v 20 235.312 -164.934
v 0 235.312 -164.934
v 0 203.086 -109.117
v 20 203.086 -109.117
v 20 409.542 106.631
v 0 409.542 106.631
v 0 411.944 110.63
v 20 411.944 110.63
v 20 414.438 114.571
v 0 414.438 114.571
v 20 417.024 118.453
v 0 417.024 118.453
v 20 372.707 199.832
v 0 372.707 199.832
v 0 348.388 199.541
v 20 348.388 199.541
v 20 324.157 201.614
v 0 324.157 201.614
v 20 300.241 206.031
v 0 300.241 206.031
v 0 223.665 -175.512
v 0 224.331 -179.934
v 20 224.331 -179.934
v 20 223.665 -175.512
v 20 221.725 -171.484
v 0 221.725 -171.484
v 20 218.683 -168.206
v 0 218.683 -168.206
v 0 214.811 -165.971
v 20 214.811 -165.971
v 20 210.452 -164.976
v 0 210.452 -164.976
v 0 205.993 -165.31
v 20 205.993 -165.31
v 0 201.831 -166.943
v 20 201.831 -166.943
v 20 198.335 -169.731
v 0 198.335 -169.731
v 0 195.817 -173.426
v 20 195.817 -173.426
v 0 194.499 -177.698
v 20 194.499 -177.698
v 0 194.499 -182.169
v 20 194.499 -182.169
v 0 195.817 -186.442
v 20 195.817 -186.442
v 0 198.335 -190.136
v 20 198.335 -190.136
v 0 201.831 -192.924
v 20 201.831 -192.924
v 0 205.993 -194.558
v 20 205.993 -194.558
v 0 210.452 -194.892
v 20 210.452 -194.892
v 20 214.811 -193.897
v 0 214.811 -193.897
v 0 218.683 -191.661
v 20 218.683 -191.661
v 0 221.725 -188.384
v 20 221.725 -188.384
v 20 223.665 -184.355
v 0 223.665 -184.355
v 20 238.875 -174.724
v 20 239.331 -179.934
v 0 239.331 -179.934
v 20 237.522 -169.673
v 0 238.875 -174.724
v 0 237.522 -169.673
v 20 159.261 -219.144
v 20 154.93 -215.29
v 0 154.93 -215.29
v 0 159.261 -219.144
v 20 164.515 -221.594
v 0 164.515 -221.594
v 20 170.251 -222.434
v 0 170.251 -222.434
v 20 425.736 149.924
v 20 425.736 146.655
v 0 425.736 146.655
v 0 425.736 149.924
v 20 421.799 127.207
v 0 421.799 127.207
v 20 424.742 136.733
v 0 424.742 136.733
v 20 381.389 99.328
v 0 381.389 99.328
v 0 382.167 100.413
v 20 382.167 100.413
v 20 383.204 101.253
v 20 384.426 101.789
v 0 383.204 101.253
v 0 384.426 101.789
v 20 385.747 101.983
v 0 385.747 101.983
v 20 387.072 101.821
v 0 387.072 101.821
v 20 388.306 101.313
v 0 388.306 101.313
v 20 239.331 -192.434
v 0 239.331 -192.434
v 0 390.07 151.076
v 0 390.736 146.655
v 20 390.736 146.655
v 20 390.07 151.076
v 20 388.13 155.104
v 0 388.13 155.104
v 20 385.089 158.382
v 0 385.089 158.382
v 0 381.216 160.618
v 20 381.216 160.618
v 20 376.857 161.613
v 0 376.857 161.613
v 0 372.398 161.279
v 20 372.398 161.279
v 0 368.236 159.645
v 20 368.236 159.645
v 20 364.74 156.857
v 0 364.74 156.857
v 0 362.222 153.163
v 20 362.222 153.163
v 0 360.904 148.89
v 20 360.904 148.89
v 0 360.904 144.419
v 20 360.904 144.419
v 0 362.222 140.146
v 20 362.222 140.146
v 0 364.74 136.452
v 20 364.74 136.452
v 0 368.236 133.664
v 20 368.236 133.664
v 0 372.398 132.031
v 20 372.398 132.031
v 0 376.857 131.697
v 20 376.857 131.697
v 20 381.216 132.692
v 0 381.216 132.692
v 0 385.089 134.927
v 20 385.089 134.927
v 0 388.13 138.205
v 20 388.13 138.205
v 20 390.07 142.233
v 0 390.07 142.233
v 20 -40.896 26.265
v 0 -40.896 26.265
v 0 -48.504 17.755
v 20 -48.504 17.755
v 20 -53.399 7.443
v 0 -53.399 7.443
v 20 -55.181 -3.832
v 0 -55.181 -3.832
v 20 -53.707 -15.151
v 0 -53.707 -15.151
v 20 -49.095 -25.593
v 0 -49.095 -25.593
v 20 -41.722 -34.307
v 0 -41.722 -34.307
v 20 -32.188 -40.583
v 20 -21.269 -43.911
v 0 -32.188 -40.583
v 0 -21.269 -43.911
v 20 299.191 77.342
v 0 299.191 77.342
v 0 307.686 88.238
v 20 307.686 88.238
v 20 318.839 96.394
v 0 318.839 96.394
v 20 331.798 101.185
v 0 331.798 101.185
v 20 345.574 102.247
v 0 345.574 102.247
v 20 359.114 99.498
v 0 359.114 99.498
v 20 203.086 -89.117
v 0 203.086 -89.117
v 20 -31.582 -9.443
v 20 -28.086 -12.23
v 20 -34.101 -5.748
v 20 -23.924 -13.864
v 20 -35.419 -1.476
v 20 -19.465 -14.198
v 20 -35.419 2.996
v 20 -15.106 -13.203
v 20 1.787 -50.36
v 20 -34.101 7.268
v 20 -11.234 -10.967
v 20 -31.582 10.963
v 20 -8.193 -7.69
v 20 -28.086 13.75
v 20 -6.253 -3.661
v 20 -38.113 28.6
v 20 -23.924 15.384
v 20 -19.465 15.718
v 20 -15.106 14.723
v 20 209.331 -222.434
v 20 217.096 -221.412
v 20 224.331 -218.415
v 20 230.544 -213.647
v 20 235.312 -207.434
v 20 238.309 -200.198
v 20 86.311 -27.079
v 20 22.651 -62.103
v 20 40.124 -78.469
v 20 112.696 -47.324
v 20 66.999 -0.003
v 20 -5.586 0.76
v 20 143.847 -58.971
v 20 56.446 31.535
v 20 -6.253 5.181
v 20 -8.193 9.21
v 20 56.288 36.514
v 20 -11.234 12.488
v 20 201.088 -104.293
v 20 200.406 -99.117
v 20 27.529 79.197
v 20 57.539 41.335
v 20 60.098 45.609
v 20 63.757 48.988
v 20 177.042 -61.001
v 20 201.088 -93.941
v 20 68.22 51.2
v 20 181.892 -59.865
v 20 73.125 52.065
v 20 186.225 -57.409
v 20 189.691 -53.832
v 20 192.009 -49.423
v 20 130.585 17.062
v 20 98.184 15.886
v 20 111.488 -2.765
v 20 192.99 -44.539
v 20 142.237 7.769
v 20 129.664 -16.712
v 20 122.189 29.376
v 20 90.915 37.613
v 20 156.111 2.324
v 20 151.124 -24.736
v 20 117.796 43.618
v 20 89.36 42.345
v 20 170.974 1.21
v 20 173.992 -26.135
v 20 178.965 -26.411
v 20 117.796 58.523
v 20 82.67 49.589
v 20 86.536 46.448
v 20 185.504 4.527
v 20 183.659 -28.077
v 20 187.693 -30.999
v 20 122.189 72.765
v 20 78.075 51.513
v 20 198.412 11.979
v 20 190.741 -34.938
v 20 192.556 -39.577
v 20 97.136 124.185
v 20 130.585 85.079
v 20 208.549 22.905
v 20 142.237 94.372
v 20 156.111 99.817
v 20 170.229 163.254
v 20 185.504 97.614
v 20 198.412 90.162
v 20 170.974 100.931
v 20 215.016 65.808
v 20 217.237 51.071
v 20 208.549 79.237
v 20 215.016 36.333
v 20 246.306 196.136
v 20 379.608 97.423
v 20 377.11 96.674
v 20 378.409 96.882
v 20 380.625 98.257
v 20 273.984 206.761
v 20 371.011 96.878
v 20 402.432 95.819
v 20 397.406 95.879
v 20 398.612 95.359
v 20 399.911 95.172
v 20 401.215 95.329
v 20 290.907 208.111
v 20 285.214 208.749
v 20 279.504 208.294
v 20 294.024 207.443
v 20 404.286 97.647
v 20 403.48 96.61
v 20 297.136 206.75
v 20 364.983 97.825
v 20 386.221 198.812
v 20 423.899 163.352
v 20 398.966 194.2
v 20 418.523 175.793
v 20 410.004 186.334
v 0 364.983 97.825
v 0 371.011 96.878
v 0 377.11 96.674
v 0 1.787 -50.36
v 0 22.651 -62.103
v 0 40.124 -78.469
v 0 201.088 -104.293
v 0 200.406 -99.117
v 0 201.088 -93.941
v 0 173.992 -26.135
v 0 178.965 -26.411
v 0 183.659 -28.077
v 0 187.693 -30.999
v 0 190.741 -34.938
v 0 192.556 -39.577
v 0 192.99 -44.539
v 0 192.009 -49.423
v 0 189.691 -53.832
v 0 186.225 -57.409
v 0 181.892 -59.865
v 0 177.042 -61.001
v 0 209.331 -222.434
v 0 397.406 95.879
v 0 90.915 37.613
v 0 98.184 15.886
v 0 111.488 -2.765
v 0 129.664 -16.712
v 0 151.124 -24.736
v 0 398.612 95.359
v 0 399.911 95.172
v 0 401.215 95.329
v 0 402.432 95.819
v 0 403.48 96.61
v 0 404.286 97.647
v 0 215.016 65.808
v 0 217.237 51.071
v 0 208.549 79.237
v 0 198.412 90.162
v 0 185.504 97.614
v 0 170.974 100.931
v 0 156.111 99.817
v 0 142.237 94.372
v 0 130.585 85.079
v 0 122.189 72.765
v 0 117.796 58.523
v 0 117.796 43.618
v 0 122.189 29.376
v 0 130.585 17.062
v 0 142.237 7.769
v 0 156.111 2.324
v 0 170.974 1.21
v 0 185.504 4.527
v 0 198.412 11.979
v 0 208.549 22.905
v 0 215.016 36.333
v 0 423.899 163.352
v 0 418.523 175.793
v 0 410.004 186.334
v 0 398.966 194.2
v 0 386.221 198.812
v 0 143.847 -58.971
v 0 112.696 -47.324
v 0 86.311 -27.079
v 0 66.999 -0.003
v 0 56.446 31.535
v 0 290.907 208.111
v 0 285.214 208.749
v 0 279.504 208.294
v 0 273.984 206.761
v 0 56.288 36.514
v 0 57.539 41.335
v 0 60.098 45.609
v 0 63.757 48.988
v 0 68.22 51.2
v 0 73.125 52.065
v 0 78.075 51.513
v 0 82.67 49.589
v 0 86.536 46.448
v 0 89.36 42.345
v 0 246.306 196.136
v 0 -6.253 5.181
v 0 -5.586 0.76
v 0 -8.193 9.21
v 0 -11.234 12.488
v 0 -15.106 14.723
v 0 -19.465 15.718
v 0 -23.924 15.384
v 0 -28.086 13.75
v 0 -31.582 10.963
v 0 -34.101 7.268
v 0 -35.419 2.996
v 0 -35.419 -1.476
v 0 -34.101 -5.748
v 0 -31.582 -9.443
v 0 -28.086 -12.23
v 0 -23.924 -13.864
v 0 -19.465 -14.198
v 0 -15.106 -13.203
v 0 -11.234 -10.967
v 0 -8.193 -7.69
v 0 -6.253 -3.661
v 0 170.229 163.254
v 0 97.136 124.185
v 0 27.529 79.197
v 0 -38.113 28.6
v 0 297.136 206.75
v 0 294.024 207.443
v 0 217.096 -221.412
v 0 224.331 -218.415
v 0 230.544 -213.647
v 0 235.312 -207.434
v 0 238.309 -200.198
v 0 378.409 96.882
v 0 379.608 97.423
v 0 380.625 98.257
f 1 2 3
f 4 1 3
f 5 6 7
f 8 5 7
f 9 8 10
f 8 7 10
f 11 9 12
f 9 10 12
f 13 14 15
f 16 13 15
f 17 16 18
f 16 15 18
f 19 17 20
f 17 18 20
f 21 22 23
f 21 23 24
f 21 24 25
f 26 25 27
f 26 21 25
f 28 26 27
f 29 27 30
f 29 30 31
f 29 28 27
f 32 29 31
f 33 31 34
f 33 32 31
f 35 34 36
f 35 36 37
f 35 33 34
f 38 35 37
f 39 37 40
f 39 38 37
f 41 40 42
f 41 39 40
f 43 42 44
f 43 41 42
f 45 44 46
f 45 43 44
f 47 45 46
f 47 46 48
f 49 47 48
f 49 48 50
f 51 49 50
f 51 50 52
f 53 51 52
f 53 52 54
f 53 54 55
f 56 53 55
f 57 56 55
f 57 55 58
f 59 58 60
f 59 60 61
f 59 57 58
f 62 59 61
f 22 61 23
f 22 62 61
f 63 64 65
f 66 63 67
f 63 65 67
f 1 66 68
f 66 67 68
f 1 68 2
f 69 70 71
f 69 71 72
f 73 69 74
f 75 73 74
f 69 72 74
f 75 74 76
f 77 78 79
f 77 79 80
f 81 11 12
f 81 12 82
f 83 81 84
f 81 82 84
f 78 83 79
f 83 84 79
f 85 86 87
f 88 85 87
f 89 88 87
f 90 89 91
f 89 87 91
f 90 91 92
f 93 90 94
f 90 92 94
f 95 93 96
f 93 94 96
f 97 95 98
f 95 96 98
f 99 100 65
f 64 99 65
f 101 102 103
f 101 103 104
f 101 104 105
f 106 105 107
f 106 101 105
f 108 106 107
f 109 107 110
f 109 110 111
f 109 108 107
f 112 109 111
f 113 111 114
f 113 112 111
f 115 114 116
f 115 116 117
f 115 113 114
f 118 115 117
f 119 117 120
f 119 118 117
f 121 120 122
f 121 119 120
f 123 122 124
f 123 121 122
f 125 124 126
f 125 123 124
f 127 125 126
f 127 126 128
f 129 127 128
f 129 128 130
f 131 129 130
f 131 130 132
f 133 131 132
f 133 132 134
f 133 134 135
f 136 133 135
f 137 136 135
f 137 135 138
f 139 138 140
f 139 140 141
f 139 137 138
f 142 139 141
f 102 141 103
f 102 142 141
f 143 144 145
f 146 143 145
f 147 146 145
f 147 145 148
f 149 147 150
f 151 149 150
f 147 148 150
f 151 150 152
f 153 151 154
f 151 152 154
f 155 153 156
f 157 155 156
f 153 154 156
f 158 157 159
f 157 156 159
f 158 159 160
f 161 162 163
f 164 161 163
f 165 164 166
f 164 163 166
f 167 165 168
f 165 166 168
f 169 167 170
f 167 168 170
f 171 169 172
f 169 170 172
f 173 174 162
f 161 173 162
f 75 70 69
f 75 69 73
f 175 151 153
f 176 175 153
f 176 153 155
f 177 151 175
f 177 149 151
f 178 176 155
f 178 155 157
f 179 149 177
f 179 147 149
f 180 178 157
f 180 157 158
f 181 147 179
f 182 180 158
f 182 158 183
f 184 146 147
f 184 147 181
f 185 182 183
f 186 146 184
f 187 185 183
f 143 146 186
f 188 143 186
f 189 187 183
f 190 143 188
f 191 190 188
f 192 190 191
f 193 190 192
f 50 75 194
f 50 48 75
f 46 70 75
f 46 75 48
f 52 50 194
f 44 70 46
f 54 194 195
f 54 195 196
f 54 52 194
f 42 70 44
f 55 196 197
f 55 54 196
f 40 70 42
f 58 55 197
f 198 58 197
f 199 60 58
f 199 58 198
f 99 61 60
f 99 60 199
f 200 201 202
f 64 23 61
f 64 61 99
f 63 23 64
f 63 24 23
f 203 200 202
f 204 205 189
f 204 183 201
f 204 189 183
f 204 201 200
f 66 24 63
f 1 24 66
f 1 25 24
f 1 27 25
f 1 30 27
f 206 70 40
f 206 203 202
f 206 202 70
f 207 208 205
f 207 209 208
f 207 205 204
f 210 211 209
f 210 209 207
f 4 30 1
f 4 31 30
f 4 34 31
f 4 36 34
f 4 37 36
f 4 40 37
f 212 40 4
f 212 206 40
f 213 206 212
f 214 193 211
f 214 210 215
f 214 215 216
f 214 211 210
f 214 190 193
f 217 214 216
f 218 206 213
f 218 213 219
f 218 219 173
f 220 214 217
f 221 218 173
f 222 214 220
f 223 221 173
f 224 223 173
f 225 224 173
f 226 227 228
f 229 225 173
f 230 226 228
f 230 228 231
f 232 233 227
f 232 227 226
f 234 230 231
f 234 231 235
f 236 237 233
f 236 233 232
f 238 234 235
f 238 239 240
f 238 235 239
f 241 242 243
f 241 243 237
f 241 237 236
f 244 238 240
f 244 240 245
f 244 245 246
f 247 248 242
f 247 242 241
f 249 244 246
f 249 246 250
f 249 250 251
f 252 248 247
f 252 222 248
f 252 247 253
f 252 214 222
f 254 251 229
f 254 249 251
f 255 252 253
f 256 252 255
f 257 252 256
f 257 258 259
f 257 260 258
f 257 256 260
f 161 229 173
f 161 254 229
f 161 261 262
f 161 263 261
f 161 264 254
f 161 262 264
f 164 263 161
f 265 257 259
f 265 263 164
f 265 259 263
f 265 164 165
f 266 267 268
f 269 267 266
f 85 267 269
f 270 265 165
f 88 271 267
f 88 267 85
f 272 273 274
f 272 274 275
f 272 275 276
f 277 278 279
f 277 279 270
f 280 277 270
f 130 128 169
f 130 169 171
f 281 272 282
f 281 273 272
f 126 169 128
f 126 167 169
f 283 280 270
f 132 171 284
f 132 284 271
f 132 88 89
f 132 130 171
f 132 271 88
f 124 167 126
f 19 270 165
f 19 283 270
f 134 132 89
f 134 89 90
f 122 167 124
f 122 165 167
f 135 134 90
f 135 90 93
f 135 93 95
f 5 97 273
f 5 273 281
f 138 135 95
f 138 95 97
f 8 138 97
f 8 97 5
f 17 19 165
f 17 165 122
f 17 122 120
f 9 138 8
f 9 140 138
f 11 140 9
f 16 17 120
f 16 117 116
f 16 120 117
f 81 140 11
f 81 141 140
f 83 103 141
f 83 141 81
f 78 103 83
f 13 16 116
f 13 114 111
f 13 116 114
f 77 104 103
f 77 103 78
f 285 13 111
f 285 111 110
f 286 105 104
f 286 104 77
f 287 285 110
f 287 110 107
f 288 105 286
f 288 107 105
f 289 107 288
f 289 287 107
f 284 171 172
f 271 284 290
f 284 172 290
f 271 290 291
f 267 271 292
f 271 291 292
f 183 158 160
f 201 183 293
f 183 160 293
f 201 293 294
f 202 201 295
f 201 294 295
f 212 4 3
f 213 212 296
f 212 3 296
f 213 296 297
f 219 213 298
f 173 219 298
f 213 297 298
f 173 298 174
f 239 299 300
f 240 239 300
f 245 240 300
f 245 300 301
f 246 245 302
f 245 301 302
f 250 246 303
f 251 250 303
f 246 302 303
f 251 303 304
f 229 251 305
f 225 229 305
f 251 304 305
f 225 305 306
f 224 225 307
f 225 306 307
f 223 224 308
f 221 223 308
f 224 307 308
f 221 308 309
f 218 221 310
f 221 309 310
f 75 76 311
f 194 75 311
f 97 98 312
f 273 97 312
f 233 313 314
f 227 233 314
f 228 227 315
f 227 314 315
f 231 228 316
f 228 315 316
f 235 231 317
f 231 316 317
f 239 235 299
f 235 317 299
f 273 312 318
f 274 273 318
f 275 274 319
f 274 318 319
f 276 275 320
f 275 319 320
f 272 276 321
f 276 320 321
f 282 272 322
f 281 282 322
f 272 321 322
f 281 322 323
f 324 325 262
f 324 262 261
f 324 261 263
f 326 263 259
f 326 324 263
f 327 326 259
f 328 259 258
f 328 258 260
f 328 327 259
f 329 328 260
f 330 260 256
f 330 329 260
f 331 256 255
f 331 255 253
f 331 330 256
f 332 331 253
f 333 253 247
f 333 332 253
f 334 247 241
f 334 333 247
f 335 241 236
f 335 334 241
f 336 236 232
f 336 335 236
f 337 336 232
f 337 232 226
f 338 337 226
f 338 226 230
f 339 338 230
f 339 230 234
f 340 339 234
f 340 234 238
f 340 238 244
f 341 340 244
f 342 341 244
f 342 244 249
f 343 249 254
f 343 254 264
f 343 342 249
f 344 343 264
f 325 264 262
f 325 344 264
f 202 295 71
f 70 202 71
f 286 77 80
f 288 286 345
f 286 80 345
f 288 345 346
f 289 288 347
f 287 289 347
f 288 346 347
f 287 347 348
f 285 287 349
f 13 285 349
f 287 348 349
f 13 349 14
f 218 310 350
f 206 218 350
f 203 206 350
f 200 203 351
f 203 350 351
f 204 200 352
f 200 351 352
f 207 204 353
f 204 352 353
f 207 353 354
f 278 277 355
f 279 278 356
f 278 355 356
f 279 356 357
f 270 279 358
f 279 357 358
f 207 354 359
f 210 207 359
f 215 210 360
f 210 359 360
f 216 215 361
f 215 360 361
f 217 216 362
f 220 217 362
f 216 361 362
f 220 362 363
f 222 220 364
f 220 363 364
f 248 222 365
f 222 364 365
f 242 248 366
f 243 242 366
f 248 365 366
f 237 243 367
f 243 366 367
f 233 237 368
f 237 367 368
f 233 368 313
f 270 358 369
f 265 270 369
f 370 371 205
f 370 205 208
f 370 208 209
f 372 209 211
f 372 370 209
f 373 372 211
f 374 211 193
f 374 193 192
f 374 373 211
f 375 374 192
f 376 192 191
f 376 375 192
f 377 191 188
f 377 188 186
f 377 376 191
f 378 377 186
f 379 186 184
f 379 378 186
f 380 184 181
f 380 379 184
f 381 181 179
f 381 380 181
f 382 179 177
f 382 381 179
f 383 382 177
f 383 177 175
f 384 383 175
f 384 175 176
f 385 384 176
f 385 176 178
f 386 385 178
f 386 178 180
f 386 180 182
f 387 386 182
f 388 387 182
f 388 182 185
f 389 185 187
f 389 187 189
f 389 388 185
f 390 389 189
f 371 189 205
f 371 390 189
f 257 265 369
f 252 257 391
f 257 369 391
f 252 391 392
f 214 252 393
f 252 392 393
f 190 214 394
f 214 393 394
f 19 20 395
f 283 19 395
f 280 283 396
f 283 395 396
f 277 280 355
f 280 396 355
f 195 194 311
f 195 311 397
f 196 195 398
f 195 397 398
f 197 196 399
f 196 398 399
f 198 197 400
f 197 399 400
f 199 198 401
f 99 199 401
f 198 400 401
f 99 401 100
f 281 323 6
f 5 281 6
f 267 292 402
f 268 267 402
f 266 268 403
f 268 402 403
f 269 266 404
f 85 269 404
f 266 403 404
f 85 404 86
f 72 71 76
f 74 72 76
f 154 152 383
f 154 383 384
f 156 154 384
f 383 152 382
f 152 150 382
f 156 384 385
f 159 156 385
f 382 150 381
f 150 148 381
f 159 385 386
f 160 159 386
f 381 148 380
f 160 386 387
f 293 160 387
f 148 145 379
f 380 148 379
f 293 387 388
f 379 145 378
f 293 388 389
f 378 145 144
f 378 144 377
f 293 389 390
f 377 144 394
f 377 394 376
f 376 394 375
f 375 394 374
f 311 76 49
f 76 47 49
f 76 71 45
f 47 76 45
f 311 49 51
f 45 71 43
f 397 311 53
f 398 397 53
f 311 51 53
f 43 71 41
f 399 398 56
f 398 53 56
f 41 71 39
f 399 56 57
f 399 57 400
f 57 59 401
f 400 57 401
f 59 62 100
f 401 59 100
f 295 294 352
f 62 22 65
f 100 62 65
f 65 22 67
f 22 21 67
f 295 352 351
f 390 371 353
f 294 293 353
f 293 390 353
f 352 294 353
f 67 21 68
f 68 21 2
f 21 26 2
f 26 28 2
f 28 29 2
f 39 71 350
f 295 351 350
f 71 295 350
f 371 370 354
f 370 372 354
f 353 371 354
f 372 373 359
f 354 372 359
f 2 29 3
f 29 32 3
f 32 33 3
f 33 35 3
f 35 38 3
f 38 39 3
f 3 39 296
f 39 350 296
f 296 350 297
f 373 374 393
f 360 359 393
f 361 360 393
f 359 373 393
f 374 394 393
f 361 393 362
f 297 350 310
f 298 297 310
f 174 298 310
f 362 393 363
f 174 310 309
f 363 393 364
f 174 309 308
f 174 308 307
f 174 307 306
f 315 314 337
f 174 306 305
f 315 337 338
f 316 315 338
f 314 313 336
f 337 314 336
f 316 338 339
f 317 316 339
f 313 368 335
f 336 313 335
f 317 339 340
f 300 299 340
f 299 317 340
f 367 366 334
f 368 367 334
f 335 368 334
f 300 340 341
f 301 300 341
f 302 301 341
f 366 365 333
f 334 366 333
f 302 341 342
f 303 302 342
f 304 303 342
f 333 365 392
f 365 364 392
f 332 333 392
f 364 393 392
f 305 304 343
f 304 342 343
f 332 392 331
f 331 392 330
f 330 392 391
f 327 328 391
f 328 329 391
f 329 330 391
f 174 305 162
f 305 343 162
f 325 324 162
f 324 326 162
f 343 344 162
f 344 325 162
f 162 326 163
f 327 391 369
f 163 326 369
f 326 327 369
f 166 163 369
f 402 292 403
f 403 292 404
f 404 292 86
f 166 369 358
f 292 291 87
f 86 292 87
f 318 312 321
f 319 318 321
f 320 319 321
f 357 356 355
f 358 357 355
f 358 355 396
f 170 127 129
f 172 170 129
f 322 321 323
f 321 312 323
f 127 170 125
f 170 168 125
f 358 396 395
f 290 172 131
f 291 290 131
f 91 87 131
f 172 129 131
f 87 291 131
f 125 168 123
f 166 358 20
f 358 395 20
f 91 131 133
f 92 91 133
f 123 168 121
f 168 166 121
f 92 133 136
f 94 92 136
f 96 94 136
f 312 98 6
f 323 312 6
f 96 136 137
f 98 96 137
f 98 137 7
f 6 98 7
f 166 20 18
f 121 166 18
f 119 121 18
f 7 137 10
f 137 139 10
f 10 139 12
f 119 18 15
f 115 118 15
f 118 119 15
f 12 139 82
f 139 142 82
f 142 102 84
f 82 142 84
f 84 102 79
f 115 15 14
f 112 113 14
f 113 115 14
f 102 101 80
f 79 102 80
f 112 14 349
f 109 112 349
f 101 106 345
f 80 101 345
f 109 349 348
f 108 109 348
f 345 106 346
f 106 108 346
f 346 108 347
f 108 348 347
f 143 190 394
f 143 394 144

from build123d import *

# Parameters (mm, degrees)
F0_R     = 1.5
F0_R_2   = 5
F1_DEPTH = 2
F2_SCALE = 10


# Not quite as in the source:
# - ends of sketch curves that miss each other by under 0.0002 mm in the source are joined


with BuildPart() as f1:
    # F0 (on Right) → F1 (new body)
    with BuildSketch(Plane.YZ):
        with BuildLine():
            Line((20.303062, 10.815357), (21.213073, 10.271883))
            ThreePointArc((21.213073, 10.271883), (21.5939035848, 10.2168943828), (21.901025054, 10.4486959684))
            Line((21.901025054, 10.4486959684), (22.426599, 11.34717))
            ThreePointArc((22.426599, 11.34717), (22.7903712384, 11.9448053837), (23.1748242578, 12.529351507))
            ThreePointArc((23.1748242578, 12.529351507), (23.8232826043, 13.8736711803), (24.046052, 15.349499))
            Line((24.046052, 15.349499), (24.046052, 15.676385))
            ThreePointArc((24.046052, 15.676385), (22.4727964344, 19.3174593718), (18.7430829675, 20.6671975356))
            ThreePointArc((18.7430829675, 20.6671975356), (15.0971647826, 20.7122553198), (11.4965779735, 21.2871678873))
            ThreePointArc((11.4965779735, 21.2871678873), (11.0304932137, 21.3939885254), (10.5631540495, 21.4951802352))
            ThreePointArc((10.5631540495, 21.4951802352), (9.7072570471, 21.5498382875), (8.8708699259, 21.360092193))
            Line((8.8708699259, 21.360092193), (6.103052, 20.297626))
            ThreePointArc((6.103052, 20.297626), (-8.8139895114, 13.1024999173), (-22.3389141406, 3.5440281676))
            Line((-22.3389141406, 3.5440281676), (-22.617202, 3.310517))
            ThreePointArc((-22.617202, 3.310517), (-23.8982246357, -0.8310495022), (-20.6544870079, -3.7071160511))
            ThreePointArc((-20.6544870079, -3.7071160511), (-17.2704039619, -4.8764379221), (-14.5151312861, -7.1628772401))
            Line((-14.5151312861, -7.1628772401), (-3.03453, -20.844925))
            ThreePointArc((-3.03453, -20.844925), (-2.3476776328, -21.3719655231), (-1.502441, -21.55935))
            Line((-1.502441, -21.55935), (2.405537, -21.55935))
            ThreePointArc((2.405537, -21.55935), (4.5268573436, -20.6806703436), (5.405537, -18.55935))
            Line((5.405537, -18.55935), (5.405537, -17.30935))
            ThreePointArc((5.405537, -17.30935), (5.3033144652, -16.5328928137), (5.0036131585, -15.8093499085))
            Line((5.0036131585, -15.8093499085), (1.781026, -10.227666))
            ThreePointArc((1.781026, -10.227666), (1.513077, -9.227666), (1.7810261443, -8.2276660833))
            Line((1.7810261443, -8.2276660833), (11.391549, 8.418247))
            ThreePointArc((11.391549, 8.418247), (13.9876851036, 10.6079458785), (17.3838640825, 10.633873234))
            ThreePointArc((17.3838640825, 10.633873234), (18.2706804185, 10.4099849641), (19.1834430004, 10.3513869851))
            ThreePointArc((19.1834430004, 10.3513869851), (19.4332447525, 10.4262916315), (19.6113513075, 10.6167898368))
            ThreePointArc((19.6113513075, 10.6167898368), (19.9150373869, 10.862970839), (20.303062, 10.815357))
        make_face()
        with Locations((2.405537, -17.30935)):
            Circle(F0_R, mode=Mode.SUBTRACT)
        with Locations((-20.58619, 0.760036)):
            Circle(F0_R, mode=Mode.SUBTRACT)
        with BuildLine():
            ThreePointArc((-0.8233559685, -5.41610236), (-8.6524240902, -3.1341370676), (-12.8829452145, 3.8375459622))
            ThreePointArc((-12.8829452145, 3.8375459622), (-11.4634165059, 5.8648445334), (-9.436118366, 4.4453149355))
            ThreePointArc((-9.436118366, 4.4453149355), (-6.5217592217, -0.3574002745), (-1.1284010077, -1.9294209114))
            ThreePointArc((-1.1284010077, -1.9294209114), (0.7674627243, -3.5202384804), (-0.8233559685, -5.41610236))
        make_face(mode=Mode.SUBTRACT)
        with Locations((-1.803858, 5.791088)):
            Circle(F0_R_2, mode=Mode.SUBTRACT)
        with Locations((19.046052, 15.349499)):
            Circle(F0_R, mode=Mode.SUBTRACT)
    extrude(amount=F1_DEPTH)


with BuildPart() as f1_1:
    # F2: moved
    add(f1.part.scale(F2_SCALE).moved(Location((0, 185.27571, -6.840324))))


solid = f1_1.part
